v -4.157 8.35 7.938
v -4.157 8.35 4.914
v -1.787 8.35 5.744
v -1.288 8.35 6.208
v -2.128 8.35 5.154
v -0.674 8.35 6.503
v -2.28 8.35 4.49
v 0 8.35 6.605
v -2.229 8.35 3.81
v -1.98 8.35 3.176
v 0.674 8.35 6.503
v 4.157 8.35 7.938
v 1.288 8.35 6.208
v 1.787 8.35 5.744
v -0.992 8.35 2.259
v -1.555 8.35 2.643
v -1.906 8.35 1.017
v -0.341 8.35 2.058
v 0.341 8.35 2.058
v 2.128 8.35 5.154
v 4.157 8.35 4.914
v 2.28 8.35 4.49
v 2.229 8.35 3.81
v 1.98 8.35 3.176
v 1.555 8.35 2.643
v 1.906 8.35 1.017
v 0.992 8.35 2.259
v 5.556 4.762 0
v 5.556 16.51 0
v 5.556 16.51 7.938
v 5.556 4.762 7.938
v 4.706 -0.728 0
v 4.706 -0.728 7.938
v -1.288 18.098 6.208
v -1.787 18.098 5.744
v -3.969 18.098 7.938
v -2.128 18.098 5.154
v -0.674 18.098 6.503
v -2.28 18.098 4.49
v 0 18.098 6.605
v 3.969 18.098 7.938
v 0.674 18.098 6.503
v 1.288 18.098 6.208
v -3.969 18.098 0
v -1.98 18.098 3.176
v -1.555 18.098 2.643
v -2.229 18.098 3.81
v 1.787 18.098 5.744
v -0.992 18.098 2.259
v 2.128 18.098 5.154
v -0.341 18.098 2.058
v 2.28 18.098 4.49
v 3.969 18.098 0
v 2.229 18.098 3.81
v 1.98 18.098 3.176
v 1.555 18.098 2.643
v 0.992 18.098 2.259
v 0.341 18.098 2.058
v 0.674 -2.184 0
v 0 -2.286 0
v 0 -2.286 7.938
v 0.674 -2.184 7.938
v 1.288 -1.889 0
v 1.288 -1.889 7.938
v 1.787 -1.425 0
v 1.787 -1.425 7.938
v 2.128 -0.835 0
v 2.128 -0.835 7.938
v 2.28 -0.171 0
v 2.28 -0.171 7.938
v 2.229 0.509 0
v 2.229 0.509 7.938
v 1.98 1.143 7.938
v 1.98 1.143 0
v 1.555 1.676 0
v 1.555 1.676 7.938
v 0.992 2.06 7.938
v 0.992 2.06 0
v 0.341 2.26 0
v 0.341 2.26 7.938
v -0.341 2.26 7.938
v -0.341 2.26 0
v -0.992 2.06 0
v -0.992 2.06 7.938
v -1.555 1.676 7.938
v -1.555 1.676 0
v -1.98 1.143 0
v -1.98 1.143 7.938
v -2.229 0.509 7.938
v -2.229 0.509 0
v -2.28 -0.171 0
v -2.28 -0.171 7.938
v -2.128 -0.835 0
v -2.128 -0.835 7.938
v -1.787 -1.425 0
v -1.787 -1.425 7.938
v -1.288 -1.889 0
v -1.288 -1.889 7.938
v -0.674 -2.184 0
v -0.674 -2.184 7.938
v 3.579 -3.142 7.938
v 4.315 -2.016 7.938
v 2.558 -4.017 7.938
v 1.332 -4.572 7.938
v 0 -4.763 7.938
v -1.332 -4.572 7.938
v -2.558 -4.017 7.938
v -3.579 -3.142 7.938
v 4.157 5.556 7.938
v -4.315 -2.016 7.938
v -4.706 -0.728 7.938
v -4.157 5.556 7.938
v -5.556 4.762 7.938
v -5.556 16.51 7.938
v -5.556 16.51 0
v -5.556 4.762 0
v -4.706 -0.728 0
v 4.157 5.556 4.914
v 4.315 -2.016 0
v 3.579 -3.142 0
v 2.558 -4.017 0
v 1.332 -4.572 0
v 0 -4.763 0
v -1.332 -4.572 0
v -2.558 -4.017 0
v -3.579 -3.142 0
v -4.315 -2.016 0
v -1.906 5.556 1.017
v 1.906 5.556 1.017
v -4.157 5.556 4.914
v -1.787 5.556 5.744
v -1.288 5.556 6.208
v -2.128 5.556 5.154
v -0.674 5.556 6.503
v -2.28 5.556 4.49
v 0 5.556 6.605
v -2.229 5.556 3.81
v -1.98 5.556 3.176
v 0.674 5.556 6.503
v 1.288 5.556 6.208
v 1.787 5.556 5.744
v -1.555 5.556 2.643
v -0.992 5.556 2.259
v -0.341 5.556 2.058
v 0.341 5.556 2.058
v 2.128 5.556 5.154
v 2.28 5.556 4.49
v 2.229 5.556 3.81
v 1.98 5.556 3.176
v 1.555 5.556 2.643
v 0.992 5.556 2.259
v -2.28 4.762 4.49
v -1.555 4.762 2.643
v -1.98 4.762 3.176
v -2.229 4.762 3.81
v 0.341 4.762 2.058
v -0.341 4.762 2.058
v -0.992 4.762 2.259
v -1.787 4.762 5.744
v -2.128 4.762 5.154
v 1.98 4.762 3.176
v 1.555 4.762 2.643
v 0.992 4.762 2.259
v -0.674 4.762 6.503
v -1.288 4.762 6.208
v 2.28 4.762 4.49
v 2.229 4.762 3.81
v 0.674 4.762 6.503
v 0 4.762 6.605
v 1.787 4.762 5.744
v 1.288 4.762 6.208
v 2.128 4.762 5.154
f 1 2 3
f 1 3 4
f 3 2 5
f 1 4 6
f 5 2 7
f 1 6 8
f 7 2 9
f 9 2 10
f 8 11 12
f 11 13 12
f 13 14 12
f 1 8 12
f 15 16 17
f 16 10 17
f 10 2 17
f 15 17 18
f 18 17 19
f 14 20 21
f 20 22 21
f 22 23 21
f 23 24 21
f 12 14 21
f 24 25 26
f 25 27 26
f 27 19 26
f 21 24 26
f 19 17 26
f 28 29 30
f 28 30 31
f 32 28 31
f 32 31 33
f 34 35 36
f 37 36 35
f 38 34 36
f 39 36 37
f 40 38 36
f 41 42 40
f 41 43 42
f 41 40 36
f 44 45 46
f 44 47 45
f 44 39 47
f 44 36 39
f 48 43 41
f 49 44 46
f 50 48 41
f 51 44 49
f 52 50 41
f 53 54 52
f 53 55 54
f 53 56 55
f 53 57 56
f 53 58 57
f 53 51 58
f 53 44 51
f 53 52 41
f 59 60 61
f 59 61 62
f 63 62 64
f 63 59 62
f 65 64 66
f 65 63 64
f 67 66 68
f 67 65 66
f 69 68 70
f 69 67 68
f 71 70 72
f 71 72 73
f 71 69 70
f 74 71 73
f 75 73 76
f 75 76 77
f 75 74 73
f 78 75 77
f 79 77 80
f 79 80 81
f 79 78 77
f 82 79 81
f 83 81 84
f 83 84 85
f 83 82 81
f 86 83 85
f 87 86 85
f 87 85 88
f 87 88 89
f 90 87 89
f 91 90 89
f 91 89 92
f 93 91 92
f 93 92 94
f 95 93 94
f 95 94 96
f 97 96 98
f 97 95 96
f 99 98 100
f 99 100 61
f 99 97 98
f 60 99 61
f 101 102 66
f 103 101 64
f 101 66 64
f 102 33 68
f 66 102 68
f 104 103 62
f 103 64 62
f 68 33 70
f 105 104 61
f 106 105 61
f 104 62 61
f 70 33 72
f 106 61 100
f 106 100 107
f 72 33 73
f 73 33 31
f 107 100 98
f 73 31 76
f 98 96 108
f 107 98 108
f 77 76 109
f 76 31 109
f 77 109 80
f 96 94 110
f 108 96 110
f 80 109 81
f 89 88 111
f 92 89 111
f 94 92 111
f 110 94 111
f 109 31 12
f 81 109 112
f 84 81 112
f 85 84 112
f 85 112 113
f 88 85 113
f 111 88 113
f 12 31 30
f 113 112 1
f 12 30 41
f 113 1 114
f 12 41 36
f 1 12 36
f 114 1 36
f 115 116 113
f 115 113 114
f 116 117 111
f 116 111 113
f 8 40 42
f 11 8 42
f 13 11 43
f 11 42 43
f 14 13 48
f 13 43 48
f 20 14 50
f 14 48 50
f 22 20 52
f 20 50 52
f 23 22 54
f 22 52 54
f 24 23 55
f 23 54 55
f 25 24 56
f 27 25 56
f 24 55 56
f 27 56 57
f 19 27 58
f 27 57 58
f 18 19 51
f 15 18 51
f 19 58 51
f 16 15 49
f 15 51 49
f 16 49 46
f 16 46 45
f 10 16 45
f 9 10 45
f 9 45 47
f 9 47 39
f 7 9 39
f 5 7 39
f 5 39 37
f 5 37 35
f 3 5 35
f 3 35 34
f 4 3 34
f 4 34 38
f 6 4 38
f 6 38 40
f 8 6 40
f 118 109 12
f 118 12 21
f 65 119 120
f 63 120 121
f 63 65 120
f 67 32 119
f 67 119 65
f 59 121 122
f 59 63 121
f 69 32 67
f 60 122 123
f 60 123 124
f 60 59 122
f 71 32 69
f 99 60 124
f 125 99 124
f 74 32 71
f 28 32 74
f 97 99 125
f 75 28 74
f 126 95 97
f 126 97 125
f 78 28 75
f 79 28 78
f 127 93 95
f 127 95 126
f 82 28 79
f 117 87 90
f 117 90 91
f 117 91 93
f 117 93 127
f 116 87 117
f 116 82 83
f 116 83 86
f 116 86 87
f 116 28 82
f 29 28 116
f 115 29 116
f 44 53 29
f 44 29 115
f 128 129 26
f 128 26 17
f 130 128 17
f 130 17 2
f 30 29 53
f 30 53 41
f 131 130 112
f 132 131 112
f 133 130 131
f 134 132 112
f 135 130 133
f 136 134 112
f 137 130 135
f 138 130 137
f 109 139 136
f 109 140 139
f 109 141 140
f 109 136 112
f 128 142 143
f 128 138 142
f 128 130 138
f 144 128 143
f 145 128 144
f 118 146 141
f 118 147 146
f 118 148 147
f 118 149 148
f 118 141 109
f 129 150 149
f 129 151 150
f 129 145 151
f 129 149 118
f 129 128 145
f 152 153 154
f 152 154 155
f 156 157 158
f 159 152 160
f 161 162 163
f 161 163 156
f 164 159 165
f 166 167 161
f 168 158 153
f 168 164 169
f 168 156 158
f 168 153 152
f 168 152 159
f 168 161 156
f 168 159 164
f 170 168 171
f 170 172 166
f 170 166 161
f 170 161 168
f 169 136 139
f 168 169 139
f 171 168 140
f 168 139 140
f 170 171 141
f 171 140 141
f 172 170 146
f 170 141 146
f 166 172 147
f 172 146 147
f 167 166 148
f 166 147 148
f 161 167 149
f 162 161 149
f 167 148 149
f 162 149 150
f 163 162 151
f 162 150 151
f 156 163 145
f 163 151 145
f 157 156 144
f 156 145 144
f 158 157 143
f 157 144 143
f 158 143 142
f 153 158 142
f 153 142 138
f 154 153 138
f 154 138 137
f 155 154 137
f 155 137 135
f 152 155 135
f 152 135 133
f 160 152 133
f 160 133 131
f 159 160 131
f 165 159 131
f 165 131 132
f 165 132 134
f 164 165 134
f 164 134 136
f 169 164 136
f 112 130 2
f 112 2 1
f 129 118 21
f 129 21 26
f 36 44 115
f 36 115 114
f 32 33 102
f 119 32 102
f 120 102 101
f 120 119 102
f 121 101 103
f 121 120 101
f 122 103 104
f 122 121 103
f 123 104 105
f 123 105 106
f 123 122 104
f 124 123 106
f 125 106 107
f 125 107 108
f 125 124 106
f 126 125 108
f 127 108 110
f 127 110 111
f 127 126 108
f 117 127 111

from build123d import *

# Parameters (mm, degrees)
SKETCH1_R           = 2.286
BOSS_EXTRUDE1_DEPTH = 7.9375
SKETCH2_R           = 2.286
CUT_EXTRUDE1_DEPTH  = 13.335
CUT_EXTRUDE2_START  = 0.79375
CUT_EXTRUDE2_DEPTH  = 2.794
CHAMFER1_SIZE       = 1.5875


with BuildPart() as part:
    # Sketch1 → Boss-Extrude1 (new body)
    with BuildSketch(Plane.XY):
        with BuildLine():
            Line((-5.55625, 4.7625), (-5.55625, 18.0975))
            Line((-5.55625, 18.0975), (5.55625, 18.0975))
            Line((5.55625, 18.0975), (5.55625, 4.7625))
            Line((5.55625, 4.7625), (4.706470588, -0.728382353))
            ThreePointArc((4.706470588, -0.728382353), (0, -4.7625), (-4.706470588, -0.728382353))
            Line((-4.706470588, -0.728382353), (-5.55625, 4.7625))
        make_face()
        with Locations(Location((0, 0, 0), (0, 0, 270))):
            Circle(SKETCH1_R, mode=Mode.SUBTRACT)
    extrude(amount=BOSS_EXTRUDE1_DEPTH)

    # Sketch2 → Cut-Extrude1 (cut)
    with BuildSketch(Plane(origin=(0, 18.0975, 0), x_dir=(1, 0, 0), z_dir=(0, 1, 0))):
        with Locations(Location((2.54e-07, -4.318750409, 0), (0, 0, 270))):
            Circle(SKETCH2_R)
    extrude(amount=-CUT_EXTRUDE1_DEPTH, mode=Mode.SUBTRACT)

    # Sketch3 → Cut-Extrude2 (cut)
    with BuildSketch(Plane(origin=(0, 4.7625, 0), x_dir=(1, 0, 0), z_dir=(0, 1, 0)).offset(CUT_EXTRUDE2_START)):
        Polygon((-1.906410334, -1.016750409), (-4.156524955, -4.914063255), (-4.156524955, -7.9375), (4.156521786, -7.9375), (4.156521786, -4.914056884), (1.906410843, -1.016750409), align=None)
    extrude(amount=CUT_EXTRUDE2_DEPTH, mode=Mode.SUBTRACT)

    # Chamfer1
    chamfer1_edges = [part.edges().sort_by_distance(p)[0] for p in [
        (-5.55625, 18.0975, 3.96875),
        (5.55625, 18.0975, 3.96875),
    ]]
    chamfer(chamfer1_edges, length=CHAMFER1_SIZE)


solid = part.part
